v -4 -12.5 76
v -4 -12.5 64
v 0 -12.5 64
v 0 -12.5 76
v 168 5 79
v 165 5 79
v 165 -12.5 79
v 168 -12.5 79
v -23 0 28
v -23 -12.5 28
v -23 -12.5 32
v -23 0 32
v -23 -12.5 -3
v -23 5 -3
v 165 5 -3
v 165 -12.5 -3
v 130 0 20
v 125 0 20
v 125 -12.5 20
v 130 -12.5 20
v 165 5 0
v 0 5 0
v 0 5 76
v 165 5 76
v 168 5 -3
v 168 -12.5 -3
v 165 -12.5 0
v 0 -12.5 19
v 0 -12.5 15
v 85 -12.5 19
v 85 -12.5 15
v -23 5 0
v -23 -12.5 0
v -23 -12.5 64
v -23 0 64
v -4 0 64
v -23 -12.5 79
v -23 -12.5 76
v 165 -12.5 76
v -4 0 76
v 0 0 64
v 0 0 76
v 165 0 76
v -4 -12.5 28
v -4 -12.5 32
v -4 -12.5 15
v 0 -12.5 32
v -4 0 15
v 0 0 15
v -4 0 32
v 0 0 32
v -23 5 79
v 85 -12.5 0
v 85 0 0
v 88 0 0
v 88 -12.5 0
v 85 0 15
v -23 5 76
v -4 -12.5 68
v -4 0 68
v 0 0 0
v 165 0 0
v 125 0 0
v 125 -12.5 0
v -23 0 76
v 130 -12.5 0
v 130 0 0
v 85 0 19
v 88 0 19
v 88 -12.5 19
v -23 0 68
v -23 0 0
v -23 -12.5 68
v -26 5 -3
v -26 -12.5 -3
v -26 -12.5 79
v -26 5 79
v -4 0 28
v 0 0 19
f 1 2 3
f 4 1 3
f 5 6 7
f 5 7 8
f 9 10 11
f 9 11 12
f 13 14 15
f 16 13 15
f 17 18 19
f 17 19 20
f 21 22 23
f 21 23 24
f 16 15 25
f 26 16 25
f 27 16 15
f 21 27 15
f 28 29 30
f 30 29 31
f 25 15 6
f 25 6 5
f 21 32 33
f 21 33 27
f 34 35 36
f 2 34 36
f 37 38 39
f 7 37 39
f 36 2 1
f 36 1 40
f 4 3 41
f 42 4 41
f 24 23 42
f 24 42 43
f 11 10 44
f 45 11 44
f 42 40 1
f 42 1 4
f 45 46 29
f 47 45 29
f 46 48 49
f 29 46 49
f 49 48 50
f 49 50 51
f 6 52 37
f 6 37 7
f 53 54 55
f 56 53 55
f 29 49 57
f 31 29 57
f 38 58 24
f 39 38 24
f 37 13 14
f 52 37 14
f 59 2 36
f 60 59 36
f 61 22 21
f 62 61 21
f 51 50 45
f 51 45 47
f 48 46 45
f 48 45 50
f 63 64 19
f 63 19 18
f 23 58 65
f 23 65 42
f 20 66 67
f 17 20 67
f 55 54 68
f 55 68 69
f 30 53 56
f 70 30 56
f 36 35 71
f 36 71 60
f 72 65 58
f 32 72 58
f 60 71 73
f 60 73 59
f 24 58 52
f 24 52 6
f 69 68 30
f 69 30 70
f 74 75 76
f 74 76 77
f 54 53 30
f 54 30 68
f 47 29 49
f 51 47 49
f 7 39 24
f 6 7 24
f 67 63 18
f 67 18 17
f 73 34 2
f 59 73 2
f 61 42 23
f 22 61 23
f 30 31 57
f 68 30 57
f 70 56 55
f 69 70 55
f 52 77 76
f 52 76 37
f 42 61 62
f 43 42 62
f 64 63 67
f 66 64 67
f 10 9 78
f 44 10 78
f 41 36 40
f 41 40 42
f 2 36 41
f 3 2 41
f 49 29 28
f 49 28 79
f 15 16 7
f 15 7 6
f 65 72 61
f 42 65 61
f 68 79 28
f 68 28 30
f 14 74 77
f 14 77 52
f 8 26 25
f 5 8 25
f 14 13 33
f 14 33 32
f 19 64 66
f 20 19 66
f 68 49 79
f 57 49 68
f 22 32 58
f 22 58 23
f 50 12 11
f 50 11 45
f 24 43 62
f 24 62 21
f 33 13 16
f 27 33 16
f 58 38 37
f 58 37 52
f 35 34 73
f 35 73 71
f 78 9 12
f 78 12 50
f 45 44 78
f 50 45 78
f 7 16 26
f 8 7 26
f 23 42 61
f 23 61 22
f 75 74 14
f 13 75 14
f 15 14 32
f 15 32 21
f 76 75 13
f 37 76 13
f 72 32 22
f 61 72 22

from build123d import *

# Parameters (mm, degrees)
BOX_W        = 165
BOX_H        = 5
BOX_DEPTH    = 76
BOX001_W     = 188
BOX001_H     = 17.5
BOX001_DEPTH = 3
BOX002_W     = 23
BOX002_H     = 5
BOX002_DEPTH = 76
BOX003_W     = 188
BOX003_H     = 17.5
BOX003_DEPTH = 3
BOX004_W     = 3
BOX004_H     = 17.5
BOX004_DEPTH = 82
BOX005_W     = 3
BOX005_H     = 17.5
BOX005_DEPTH = 82
BOX006_W     = 5
BOX006_H     = 12.5
BOX006_DEPTH = 20
BOX007_W     = 3
BOX007_H     = 12.5
BOX007_DEPTH = 19
BOX008_W     = 85
BOX008_H     = 12.5
BOX008_DEPTH = 4
BOX009_W     = 4
BOX009_H     = 12.5
BOX009_DEPTH = 17
BOX010_W     = 19
BOX010_H     = 12.5
BOX010_DEPTH = 4
BOX011_W     = 19
BOX011_H     = 12.5
BOX011_DEPTH = 4
BOX013_W     = 4
BOX013_H     = 12.5
BOX013_DEPTH = 12


with BuildPart() as base:
    # Box → Box (new body)
    with BuildSketch(Plane.XY):
        with Locations((82.5, 2.5)):
            Rectangle(BOX_W, BOX_H)
    extrude(amount=BOX_DEPTH)


with BuildPart() as box001:
    # Box001 → Box001 (new body)
    with BuildSketch(Plane(origin=(-23, -12.5, -3), x_dir=(1, 0, 0), z_dir=(0, 0, 1))):
        with Locations((94, 8.75)):
            Rectangle(BOX001_W, BOX001_H)
    extrude(amount=BOX001_DEPTH)


with BuildPart() as box002:
    # Box002 → Box002 (new body)
    with BuildSketch(Plane(origin=(-23, 0, 0), x_dir=(1, 0, 0), z_dir=(0, 0, 1))):
        with Locations((11.5, 2.5)):
            Rectangle(BOX002_W, BOX002_H)
    extrude(amount=BOX002_DEPTH)


with BuildPart() as box003:
    # Box003 → Box003 (new body)
    with BuildSketch(Plane(origin=(-23, -12.5, 76), x_dir=(1, 0, 0), z_dir=(0, 0, 1))):
        with Locations((94, 8.75)):
            Rectangle(BOX003_W, BOX003_H)
    extrude(amount=BOX003_DEPTH)


with BuildPart() as box004:
    # Box004 → Box004 (new body)
    with BuildSketch(Plane(origin=(-26, -12.5, -3), x_dir=(1, 0, 0), z_dir=(0, 0, 1))):
        with Locations((1.5, 8.75)):
            Rectangle(BOX004_W, BOX004_H)
    extrude(amount=BOX004_DEPTH)


with BuildPart() as box005:
    # Box005 → Box005 (new body)
    with BuildSketch(Plane(origin=(165, -12.5, -3), x_dir=(1, 0, 0), z_dir=(0, 0, 1))):
        with Locations((1.5, 8.75)):
            Rectangle(BOX005_W, BOX005_H)
    extrude(amount=BOX005_DEPTH)


with BuildPart() as box006:
    # Box006 → Box006 (new body)
    with BuildSketch(Plane(origin=(125, -12.5, 0), x_dir=(1, 0, 0), z_dir=(0, 0, 1))):
        with Locations((2.5, 6.25)):
            Rectangle(BOX006_W, BOX006_H)
    extrude(amount=BOX006_DEPTH)


with BuildPart() as box007:
    # Box007 → Box007 (new body)
    with BuildSketch(Plane(origin=(85, -12.5, 0), x_dir=(1, 0, 0), z_dir=(0, 0, 1))):
        with Locations((1.5, 6.25)):
            Rectangle(BOX007_W, BOX007_H)
    extrude(amount=BOX007_DEPTH)


with BuildPart() as box008:
    # Box008 → Box008 (new body)
    with BuildSketch(Plane(origin=(0, -12.5, 15), x_dir=(1, 0, 0), z_dir=(0, 0, 1))):
        with Locations((42.5, 6.25)):
            Rectangle(BOX008_W, BOX008_H)
    extrude(amount=BOX008_DEPTH)


with BuildPart() as box009:
    # Box009 → Box009 (new body)
    with BuildSketch(Plane(origin=(-4, -12.5, 15), x_dir=(1, 0, 0), z_dir=(0, 0, 1))):
        with Locations((2, 6.25)):
            Rectangle(BOX009_W, BOX009_H)
    extrude(amount=BOX009_DEPTH)


with BuildPart() as box010:
    # Box010 → Box010 (new body)
    with BuildSketch(Plane(origin=(-23, -12.5, 28), x_dir=(1, 0, 0), z_dir=(0, 0, 1))):
        with Locations((9.5, 6.25)):
            Rectangle(BOX010_W, BOX010_H)
    extrude(amount=BOX010_DEPTH)


with BuildPart() as box011:
    # Box011 → Box011 (new body)
    with BuildSketch(Plane(origin=(-23, -12.5, 64), x_dir=(1, 0, 0), z_dir=(0, 0, 1))):
        with Locations((9.5, 6.25)):
            Rectangle(BOX011_W, BOX011_H)
    extrude(amount=BOX011_DEPTH)


with BuildPart() as box013:
    # Box013 → Box013 (new body)
    with BuildSketch(Plane(origin=(-4, -12.5, 64), x_dir=(1, 0, 0), z_dir=(0, 0, 1))):
        with Locations((2, 6.25)):
            Rectangle(BOX013_W, BOX013_H)
    extrude(amount=BOX013_DEPTH)


solid = Compound([base.part, box001.part, box002.part, box003.part, box004.part, box005.part, box006.part, box007.part, box008.part, box009.part, box010.part, box011.part, box013.part])
